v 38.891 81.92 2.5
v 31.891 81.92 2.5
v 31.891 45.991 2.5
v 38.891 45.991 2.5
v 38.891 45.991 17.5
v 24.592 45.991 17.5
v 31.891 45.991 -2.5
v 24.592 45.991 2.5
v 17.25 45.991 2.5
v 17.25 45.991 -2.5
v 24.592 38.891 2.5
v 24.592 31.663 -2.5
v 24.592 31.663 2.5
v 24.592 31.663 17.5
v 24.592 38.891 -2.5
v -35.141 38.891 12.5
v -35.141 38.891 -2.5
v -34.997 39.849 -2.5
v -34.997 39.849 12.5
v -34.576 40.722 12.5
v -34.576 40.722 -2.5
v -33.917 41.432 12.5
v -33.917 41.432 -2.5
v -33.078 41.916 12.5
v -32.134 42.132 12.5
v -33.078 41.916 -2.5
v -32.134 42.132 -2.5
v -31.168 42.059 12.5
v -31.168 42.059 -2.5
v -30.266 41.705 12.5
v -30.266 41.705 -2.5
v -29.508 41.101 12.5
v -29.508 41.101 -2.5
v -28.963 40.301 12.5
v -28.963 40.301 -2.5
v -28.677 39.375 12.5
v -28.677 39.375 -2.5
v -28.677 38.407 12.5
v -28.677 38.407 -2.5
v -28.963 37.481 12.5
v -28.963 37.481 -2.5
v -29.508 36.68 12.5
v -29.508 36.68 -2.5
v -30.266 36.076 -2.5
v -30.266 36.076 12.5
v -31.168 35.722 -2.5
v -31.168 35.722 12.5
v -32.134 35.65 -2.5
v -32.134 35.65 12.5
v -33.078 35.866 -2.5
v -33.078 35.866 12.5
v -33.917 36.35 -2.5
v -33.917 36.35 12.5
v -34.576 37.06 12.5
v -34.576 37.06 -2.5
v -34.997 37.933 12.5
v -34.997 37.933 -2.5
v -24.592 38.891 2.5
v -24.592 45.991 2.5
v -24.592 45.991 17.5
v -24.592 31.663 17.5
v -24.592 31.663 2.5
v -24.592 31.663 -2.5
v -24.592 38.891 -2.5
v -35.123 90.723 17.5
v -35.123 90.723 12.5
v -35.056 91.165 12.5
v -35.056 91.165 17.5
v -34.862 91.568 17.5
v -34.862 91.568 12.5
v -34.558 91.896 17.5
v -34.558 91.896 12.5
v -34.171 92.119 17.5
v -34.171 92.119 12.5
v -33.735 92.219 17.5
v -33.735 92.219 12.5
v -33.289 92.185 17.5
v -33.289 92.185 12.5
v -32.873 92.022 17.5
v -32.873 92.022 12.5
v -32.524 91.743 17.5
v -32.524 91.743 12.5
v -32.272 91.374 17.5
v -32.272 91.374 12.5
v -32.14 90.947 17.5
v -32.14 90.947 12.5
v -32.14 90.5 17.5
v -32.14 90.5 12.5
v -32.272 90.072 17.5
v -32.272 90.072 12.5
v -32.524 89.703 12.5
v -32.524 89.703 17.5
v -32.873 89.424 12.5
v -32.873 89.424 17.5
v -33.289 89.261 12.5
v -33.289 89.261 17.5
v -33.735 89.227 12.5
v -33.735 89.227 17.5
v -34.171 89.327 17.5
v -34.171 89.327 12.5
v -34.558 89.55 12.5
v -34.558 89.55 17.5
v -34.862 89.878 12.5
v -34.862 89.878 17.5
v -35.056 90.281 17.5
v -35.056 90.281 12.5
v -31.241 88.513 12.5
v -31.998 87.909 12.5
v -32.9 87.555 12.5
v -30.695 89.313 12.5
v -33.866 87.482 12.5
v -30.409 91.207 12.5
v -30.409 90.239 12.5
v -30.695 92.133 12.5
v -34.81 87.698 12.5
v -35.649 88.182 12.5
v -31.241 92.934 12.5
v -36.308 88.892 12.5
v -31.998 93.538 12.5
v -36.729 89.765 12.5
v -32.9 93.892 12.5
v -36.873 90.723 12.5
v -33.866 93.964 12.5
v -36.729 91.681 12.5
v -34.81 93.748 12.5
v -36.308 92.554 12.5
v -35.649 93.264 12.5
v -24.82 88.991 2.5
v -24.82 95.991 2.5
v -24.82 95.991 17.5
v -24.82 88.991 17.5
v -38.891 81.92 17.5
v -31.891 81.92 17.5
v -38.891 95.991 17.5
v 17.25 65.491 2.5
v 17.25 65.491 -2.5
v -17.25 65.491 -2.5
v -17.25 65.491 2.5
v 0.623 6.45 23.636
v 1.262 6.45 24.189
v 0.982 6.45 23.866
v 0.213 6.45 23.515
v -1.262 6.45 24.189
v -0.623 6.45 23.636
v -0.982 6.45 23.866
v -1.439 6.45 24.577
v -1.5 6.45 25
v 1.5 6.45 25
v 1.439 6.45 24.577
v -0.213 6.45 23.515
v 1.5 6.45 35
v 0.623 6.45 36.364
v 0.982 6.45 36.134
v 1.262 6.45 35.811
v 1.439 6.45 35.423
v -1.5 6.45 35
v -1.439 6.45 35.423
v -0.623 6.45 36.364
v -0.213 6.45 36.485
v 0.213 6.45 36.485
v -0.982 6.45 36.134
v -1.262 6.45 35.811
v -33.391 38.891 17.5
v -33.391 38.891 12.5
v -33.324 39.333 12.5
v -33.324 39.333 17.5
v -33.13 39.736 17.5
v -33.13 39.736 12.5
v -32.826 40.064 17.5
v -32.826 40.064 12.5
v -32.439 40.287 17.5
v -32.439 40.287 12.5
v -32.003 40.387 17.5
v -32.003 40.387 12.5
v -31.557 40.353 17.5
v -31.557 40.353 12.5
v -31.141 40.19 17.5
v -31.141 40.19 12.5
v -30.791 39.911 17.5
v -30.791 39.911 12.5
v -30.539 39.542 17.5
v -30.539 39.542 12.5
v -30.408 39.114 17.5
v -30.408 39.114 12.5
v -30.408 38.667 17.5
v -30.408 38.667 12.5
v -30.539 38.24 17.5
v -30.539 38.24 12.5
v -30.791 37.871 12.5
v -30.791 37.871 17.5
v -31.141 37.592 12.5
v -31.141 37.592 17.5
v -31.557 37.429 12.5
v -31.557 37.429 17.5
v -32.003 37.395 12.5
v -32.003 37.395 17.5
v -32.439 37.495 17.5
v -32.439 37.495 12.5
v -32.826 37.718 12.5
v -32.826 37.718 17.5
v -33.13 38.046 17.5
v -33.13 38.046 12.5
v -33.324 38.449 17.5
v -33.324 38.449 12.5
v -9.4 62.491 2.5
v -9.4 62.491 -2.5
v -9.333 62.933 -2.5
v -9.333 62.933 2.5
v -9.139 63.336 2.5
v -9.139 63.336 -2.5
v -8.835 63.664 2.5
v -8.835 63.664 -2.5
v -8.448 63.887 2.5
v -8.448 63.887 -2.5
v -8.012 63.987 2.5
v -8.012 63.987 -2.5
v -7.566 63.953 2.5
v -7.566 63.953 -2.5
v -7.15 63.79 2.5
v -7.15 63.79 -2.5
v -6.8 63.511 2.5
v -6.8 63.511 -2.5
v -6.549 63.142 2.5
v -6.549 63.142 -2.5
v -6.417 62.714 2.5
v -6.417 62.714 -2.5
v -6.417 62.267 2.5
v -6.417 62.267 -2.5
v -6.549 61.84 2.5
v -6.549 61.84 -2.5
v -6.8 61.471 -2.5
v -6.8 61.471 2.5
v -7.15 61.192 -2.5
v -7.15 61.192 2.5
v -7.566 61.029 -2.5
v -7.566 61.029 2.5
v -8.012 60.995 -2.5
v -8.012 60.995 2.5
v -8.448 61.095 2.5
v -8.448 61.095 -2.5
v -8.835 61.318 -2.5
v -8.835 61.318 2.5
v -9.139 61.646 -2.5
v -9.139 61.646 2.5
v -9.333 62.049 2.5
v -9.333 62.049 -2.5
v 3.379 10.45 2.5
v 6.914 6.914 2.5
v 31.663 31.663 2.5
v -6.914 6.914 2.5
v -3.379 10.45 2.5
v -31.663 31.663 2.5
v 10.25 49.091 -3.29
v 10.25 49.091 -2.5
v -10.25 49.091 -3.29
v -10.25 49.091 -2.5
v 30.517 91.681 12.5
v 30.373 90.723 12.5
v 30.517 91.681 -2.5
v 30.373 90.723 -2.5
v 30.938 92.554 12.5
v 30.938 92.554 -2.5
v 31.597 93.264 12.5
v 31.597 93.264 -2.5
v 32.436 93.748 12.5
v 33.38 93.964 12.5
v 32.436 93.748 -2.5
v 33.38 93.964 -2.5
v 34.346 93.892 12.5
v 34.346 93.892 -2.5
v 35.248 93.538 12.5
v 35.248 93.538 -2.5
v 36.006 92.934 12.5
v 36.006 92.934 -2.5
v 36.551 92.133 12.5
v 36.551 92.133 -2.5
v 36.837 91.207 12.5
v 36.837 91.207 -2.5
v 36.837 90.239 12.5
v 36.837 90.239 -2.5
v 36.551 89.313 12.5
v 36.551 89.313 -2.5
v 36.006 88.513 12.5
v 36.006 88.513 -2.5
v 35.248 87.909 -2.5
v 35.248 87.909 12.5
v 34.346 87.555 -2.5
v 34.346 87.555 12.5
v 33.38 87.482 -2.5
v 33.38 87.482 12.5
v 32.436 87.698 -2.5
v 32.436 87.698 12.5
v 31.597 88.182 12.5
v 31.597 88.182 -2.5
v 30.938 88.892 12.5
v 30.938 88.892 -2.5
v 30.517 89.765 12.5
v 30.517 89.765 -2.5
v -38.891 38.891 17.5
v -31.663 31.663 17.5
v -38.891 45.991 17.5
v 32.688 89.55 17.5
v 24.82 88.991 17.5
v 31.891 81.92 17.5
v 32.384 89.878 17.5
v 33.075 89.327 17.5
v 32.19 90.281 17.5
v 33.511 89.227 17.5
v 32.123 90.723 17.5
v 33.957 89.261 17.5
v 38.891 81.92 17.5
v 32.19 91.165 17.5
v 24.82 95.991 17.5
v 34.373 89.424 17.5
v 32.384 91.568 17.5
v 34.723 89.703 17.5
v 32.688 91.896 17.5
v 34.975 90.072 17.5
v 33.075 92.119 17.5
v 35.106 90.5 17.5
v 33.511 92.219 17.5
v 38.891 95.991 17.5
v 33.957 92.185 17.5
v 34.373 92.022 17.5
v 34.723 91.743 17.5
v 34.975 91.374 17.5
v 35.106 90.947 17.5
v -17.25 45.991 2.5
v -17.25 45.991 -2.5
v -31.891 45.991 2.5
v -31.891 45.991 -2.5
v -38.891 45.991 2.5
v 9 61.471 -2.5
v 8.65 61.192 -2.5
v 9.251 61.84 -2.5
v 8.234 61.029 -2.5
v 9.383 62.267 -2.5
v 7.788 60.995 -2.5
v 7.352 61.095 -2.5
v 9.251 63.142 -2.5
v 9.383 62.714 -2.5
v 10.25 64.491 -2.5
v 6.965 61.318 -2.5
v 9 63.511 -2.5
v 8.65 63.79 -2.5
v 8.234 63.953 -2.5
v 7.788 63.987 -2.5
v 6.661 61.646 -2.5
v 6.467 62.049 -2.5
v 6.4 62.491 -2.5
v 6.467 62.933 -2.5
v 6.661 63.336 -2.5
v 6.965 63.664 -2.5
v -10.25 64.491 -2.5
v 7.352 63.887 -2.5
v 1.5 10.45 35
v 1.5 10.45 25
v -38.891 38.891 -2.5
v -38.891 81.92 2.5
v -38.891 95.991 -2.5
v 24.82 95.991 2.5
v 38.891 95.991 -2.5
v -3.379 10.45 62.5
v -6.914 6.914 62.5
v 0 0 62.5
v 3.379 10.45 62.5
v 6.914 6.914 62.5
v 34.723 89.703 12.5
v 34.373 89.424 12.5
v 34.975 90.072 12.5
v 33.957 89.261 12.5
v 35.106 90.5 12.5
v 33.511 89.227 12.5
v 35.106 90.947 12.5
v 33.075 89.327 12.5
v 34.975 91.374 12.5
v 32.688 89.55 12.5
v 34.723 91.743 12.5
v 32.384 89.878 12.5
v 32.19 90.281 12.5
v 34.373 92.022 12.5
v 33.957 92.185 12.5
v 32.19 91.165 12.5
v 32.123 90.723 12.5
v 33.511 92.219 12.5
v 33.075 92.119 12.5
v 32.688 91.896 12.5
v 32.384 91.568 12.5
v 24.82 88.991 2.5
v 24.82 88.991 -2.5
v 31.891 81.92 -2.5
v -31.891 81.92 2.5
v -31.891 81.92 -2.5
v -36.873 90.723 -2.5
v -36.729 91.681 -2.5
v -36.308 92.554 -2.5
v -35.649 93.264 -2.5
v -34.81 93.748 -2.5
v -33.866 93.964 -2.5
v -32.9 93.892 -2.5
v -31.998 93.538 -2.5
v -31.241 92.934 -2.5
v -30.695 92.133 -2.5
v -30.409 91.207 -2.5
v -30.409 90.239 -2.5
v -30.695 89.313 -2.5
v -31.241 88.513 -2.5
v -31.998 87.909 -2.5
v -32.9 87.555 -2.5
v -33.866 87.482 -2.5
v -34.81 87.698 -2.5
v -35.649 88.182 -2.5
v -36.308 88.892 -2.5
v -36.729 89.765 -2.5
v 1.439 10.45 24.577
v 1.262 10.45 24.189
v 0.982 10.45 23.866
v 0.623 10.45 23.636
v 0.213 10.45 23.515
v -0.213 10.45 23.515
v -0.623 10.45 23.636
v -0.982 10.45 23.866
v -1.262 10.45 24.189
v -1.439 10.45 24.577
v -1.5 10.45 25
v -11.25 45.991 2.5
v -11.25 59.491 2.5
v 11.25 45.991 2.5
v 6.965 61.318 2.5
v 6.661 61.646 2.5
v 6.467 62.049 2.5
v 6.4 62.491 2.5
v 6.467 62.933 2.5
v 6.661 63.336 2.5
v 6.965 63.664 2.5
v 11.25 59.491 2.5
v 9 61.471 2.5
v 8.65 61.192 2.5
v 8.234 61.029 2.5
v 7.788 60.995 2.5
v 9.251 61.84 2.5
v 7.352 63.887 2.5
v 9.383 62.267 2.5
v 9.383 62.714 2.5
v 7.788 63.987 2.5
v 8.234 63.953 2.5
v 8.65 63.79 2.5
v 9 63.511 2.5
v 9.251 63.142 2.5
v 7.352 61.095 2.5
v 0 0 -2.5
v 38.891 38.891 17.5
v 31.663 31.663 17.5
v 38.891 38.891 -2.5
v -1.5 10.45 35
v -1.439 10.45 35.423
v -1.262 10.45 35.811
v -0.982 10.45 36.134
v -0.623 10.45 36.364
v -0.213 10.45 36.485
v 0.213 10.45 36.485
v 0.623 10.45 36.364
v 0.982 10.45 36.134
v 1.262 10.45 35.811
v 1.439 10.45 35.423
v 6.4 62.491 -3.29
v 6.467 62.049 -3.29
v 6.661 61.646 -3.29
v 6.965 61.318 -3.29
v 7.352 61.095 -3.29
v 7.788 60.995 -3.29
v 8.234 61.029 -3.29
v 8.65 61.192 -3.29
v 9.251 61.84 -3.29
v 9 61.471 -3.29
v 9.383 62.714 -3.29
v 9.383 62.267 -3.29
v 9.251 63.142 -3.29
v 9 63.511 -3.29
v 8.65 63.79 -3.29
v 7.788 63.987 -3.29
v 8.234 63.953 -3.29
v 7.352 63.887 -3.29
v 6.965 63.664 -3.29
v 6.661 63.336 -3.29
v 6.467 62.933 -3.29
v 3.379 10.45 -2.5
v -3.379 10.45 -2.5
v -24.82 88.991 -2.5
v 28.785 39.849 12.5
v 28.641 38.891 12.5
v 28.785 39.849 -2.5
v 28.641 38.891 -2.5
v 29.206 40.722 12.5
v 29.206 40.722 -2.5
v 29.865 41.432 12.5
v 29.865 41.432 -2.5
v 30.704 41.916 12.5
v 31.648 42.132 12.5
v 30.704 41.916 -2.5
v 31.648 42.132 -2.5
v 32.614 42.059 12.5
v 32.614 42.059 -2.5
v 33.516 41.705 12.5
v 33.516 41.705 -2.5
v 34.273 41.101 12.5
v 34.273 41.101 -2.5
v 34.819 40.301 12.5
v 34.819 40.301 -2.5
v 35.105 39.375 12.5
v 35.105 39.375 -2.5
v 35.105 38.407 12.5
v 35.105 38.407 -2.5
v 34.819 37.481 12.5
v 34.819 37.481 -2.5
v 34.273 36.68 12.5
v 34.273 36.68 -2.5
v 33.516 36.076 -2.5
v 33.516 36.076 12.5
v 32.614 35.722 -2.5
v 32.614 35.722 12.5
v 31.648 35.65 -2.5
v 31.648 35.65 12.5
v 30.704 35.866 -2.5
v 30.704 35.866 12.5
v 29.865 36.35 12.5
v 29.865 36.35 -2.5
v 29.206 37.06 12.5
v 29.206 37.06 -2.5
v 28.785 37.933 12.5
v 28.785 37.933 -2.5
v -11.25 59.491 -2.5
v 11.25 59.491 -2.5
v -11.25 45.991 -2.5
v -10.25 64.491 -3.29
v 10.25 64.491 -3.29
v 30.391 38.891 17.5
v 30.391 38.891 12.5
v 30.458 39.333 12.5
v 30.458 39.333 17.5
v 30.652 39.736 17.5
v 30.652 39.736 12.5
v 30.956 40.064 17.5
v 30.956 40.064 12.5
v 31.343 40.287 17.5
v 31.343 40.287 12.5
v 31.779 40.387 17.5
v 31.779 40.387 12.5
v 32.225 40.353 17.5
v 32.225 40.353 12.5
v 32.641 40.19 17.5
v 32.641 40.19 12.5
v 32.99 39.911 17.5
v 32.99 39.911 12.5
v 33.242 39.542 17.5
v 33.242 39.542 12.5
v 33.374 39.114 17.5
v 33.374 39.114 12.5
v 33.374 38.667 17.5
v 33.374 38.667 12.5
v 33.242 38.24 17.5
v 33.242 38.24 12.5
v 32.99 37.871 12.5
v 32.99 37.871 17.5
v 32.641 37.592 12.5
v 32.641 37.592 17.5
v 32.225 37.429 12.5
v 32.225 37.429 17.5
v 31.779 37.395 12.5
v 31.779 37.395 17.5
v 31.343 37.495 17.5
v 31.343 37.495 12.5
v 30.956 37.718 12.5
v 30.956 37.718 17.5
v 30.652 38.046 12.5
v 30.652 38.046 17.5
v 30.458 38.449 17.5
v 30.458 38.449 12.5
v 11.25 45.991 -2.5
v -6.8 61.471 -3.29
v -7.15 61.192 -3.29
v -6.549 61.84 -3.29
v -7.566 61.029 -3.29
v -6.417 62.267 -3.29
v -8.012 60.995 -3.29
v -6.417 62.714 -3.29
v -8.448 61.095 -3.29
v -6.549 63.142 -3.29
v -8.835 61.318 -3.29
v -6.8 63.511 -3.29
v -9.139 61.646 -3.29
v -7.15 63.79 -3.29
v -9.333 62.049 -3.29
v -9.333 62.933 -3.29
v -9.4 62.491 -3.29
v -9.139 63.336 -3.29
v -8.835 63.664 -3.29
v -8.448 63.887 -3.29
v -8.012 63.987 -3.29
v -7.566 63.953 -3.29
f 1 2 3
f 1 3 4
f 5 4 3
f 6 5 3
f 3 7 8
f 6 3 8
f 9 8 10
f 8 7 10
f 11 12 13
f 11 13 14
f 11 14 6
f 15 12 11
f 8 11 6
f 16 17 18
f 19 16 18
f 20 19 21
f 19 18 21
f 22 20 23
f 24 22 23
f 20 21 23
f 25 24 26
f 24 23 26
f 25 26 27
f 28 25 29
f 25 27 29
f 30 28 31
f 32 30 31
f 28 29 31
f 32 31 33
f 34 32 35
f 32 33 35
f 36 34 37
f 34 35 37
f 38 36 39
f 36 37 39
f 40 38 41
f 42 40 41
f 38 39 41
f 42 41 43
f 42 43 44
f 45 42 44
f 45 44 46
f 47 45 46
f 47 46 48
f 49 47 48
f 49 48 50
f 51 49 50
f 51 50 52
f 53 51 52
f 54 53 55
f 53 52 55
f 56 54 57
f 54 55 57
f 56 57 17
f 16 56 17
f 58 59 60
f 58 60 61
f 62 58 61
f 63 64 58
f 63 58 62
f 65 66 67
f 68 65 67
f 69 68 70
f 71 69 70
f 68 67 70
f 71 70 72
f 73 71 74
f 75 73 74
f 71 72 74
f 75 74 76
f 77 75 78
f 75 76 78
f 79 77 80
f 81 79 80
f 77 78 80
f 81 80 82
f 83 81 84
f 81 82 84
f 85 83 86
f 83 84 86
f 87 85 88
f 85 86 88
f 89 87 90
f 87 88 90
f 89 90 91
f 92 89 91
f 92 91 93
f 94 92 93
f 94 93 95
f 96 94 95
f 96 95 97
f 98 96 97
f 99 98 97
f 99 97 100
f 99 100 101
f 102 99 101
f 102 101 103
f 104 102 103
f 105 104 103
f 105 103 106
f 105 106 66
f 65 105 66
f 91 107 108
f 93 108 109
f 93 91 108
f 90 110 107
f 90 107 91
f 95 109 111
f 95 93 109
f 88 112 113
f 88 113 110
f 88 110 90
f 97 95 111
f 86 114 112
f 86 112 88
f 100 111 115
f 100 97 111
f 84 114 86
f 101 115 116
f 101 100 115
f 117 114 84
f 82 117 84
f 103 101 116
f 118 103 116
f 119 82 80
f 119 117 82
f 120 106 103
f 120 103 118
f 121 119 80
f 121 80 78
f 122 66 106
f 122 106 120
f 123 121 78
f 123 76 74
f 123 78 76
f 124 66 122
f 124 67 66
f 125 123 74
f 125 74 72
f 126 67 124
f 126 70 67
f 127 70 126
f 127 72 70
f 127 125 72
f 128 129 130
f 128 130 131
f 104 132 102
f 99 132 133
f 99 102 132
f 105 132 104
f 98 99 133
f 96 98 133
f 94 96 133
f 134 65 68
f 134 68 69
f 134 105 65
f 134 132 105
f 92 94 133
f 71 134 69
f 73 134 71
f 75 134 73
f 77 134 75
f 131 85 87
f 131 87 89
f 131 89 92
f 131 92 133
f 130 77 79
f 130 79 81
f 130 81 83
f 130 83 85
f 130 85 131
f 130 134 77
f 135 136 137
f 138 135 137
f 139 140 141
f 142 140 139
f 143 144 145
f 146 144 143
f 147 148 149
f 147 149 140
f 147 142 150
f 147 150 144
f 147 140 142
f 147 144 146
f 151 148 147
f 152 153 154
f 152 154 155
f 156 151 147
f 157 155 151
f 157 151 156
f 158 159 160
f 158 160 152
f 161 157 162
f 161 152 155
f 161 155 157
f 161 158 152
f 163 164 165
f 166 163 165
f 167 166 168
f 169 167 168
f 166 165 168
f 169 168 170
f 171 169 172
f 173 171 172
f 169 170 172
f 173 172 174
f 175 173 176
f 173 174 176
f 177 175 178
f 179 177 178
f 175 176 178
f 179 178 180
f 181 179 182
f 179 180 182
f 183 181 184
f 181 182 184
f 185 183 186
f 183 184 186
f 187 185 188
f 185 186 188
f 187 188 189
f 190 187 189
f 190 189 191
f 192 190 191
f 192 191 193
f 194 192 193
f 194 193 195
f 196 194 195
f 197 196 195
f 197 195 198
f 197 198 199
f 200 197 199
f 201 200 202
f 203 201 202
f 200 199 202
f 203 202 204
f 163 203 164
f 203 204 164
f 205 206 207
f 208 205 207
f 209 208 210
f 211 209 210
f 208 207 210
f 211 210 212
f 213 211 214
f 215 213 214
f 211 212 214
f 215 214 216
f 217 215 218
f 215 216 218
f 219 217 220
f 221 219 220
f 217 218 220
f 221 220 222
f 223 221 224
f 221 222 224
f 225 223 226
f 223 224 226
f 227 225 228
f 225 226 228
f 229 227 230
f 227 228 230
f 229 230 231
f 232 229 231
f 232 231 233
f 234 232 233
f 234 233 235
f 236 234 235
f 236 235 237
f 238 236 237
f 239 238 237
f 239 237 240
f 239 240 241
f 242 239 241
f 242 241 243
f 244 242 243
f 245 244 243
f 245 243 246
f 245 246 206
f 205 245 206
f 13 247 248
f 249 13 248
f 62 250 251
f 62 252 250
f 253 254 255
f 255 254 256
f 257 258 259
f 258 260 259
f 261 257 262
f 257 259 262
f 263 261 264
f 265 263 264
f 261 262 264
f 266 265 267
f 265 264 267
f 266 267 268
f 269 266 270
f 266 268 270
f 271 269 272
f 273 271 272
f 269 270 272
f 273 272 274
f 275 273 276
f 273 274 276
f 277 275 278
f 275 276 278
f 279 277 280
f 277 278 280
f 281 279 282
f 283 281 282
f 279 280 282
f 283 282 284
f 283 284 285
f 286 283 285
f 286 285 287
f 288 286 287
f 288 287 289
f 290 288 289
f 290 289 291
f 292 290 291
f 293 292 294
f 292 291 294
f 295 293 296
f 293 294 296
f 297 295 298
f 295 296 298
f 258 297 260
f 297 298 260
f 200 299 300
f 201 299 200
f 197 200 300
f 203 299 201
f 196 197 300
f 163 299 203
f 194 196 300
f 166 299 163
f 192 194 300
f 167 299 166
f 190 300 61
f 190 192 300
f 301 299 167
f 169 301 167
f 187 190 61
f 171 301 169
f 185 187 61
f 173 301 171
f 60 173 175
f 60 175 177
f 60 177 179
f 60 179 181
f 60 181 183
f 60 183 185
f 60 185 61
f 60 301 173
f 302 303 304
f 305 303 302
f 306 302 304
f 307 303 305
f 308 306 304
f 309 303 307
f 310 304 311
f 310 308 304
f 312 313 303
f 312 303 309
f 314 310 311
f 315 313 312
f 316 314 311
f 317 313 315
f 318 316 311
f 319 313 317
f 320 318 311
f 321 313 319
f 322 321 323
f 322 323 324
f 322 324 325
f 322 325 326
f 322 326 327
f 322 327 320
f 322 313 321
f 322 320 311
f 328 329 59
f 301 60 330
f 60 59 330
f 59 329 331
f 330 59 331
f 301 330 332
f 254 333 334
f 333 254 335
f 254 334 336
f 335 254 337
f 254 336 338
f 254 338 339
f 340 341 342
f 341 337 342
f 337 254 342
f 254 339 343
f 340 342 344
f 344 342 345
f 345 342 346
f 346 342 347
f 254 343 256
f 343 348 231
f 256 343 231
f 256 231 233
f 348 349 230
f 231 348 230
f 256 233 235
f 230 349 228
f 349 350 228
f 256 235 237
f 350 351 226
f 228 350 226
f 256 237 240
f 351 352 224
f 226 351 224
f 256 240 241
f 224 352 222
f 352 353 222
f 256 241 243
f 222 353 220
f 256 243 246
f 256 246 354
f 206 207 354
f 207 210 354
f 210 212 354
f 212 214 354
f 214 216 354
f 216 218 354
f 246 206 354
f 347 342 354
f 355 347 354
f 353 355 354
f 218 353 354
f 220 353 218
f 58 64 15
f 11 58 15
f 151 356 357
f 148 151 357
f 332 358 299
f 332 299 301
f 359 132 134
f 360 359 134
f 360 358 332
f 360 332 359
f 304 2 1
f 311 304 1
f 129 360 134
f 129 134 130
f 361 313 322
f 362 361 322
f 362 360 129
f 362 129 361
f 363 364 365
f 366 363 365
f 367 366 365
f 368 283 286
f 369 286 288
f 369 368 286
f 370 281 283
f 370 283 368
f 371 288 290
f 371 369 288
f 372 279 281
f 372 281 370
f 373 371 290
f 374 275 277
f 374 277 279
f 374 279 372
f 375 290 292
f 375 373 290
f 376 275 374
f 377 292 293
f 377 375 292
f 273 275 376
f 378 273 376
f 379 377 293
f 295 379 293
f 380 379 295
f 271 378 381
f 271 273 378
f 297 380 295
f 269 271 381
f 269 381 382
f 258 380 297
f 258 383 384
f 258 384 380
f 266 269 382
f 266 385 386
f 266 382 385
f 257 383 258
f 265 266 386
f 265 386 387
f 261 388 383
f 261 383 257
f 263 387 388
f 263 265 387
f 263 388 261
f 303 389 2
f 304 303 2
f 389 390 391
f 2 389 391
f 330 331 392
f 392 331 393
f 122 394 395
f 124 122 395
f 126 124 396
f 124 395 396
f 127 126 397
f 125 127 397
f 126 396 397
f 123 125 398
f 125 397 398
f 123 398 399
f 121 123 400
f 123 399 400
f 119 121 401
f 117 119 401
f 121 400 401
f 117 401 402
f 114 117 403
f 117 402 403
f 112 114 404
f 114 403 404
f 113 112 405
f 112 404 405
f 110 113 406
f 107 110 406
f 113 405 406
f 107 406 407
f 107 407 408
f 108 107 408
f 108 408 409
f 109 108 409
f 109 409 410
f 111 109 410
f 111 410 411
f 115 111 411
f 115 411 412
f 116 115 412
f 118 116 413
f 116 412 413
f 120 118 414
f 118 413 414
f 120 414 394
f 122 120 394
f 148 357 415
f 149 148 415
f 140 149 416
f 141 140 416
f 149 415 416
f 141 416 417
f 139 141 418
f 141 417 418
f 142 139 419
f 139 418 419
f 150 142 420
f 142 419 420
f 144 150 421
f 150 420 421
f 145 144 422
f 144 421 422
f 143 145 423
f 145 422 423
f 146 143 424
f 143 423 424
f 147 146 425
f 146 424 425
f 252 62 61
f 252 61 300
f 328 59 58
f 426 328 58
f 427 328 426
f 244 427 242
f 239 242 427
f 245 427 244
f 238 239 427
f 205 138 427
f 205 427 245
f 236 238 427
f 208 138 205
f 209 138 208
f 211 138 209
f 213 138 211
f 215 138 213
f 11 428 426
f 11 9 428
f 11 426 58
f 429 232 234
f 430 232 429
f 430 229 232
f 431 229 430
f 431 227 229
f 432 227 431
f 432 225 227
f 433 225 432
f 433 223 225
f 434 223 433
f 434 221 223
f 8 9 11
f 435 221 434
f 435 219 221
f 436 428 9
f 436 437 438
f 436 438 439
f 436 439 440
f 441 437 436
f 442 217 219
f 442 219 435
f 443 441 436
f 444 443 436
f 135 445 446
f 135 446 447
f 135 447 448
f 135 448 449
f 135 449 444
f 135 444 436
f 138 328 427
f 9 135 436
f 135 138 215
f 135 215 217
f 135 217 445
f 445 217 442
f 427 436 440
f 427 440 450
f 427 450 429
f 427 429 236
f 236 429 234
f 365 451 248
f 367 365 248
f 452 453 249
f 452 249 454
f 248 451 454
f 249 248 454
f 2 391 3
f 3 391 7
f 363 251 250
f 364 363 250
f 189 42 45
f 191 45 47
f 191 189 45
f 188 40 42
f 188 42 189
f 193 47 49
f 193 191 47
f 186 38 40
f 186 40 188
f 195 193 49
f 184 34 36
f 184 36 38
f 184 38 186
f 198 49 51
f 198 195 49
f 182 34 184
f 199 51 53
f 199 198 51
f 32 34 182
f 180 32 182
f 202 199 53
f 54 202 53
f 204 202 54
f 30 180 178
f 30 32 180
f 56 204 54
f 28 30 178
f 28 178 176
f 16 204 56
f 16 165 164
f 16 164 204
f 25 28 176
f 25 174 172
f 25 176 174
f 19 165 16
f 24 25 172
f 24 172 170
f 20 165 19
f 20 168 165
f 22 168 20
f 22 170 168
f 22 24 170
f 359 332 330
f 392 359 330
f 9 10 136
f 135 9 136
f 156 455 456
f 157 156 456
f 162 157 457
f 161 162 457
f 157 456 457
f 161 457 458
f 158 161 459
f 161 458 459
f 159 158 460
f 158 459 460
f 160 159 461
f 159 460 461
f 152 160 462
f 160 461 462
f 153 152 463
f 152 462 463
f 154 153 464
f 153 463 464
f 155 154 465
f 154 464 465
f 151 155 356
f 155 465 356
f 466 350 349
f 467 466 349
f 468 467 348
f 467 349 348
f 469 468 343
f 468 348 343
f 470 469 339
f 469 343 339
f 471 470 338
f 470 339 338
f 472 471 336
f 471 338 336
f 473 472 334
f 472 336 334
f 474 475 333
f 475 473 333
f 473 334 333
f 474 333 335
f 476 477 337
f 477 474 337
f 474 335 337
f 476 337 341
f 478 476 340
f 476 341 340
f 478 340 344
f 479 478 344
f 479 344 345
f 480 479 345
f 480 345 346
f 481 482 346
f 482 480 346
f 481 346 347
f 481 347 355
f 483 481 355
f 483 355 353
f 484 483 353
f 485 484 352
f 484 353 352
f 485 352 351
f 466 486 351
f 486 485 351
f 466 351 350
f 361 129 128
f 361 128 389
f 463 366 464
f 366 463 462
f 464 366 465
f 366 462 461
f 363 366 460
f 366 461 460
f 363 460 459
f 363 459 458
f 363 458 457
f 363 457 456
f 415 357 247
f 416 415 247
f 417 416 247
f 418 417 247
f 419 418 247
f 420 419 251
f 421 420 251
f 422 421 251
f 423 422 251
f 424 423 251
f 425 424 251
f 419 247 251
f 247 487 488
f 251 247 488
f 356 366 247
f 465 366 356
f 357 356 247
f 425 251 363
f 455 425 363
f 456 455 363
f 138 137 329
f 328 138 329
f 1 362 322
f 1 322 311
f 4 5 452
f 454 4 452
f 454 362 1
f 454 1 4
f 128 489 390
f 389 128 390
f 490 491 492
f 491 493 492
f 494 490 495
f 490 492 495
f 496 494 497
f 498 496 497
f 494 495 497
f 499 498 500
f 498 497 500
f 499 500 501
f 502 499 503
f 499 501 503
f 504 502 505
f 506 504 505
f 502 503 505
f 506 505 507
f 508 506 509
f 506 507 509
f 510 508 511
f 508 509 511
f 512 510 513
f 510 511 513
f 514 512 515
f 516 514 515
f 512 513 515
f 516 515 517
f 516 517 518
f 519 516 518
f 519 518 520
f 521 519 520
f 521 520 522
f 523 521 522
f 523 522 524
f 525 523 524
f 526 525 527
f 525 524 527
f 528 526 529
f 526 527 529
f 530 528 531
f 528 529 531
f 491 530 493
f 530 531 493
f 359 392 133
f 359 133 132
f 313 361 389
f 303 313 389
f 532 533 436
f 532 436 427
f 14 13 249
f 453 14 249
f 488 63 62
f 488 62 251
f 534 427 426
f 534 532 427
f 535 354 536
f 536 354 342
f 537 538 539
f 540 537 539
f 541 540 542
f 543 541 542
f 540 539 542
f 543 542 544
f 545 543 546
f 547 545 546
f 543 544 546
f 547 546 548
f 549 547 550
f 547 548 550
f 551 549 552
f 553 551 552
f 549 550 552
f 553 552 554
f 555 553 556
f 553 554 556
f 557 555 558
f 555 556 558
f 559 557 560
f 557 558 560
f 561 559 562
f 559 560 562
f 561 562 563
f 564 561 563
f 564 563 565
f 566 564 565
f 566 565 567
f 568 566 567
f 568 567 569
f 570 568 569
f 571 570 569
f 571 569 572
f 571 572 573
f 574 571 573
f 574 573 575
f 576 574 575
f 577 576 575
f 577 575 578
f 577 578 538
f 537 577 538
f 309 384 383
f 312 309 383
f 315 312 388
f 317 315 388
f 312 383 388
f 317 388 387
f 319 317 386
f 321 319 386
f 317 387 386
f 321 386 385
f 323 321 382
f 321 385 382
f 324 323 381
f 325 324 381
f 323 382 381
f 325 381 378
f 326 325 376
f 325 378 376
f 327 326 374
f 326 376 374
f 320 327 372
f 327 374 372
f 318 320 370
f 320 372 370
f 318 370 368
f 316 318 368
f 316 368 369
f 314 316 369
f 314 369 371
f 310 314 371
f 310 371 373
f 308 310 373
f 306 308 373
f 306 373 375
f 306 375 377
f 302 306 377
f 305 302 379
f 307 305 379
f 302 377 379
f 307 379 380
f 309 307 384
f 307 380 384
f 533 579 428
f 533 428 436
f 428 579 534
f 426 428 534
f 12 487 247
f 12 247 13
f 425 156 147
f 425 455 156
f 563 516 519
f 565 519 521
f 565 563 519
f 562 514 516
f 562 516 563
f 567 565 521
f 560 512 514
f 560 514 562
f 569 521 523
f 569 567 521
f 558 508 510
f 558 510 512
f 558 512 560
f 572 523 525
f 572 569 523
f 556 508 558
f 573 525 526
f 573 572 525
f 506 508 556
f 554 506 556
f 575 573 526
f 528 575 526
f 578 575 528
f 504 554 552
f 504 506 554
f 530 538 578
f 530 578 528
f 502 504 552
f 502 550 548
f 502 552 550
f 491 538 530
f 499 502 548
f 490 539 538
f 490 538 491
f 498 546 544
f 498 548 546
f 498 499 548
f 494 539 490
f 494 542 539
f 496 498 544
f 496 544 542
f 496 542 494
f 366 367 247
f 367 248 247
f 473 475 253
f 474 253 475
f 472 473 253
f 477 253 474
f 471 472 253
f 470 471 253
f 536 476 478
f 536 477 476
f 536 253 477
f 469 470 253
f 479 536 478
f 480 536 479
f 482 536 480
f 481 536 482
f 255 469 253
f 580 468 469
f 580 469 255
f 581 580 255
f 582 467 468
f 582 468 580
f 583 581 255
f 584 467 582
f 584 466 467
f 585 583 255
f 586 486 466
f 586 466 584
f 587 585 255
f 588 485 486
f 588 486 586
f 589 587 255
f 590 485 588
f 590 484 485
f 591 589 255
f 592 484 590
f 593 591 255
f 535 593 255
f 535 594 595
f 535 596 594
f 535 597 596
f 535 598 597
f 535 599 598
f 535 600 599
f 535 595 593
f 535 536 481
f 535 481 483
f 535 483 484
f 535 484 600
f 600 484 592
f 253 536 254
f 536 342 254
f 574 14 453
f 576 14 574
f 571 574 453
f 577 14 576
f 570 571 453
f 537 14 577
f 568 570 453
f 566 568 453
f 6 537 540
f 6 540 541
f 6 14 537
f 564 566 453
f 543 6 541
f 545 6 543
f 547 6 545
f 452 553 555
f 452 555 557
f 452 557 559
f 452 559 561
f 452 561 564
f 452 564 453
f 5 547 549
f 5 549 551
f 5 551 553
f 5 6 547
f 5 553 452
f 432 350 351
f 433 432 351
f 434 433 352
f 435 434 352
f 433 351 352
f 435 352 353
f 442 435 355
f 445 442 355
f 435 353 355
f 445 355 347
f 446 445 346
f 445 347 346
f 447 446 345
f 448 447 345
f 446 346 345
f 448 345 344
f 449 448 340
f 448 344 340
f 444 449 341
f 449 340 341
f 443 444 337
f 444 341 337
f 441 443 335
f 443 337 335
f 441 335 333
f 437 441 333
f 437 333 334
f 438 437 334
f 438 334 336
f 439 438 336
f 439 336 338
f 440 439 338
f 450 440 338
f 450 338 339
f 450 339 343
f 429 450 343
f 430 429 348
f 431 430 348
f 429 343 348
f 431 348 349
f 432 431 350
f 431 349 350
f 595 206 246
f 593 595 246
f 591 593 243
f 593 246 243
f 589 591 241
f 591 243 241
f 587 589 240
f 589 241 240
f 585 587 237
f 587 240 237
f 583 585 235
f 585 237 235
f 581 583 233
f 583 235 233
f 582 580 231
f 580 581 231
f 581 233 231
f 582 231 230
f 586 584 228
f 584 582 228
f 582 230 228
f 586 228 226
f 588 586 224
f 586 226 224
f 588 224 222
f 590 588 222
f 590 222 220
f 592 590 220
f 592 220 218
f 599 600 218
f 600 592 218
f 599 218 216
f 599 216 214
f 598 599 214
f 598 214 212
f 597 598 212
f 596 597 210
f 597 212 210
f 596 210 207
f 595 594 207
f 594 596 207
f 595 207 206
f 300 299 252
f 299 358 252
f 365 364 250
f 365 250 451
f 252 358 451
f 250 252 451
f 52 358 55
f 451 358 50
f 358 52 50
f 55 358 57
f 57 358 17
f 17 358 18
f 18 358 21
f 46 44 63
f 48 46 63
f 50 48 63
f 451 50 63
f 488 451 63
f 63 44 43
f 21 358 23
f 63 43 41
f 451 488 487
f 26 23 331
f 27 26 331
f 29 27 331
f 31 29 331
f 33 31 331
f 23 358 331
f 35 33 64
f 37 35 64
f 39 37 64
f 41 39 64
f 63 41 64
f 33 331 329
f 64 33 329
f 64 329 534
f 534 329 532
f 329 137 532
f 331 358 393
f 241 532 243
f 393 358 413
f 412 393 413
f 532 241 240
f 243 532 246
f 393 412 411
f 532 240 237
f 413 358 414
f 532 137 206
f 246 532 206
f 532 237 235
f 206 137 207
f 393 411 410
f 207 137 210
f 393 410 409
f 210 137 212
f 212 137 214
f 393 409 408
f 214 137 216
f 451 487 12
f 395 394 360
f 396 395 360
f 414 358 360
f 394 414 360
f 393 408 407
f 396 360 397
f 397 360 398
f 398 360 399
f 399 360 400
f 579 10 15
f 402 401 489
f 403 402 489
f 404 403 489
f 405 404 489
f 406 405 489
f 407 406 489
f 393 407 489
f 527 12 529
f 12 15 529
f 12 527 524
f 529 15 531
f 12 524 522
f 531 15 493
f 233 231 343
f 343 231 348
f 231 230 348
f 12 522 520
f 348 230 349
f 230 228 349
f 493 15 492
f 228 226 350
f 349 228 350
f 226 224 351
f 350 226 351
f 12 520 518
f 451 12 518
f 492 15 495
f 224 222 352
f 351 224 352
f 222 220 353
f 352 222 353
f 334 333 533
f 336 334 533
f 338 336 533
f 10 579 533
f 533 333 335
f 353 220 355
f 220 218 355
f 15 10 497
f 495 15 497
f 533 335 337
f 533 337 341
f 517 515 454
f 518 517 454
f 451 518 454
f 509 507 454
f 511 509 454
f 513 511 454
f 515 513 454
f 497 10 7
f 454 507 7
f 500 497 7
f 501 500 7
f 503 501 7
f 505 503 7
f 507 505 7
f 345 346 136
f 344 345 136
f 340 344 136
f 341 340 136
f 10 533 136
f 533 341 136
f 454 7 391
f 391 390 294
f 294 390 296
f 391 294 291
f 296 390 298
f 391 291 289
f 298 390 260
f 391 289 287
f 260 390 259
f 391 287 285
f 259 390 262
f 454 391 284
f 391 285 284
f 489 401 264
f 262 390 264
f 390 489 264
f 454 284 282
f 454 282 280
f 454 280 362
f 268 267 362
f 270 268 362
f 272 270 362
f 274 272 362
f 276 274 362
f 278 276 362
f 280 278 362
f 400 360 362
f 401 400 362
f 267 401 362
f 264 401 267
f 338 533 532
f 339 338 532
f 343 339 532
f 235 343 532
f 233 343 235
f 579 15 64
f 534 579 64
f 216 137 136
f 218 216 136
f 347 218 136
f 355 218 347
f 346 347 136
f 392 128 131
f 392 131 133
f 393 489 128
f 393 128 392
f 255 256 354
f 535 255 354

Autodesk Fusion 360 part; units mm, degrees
sketch "スケッチ1" plane through (0, 0, 0) normal (0, 0, 1) x (1, 0, 0)
  line L0 (-38.8909, 38.8909) -> (0, 0)
  line L1 (0, 0) -> (38.8909, 38.8909)
  line L2 (38.8909, 38.8909) -> (-38.8909, 38.8909) construction
  line L3 (0, 38.8909) -> (0, 0) construction
  line L4 (-24.5921, 31.6632) -> (-3.3789, 10.45)
  line L5 (-3.3789, 10.45) -> (3.3789, 10.45)
  line L6 (3.3789, 10.45) -> (24.5921, 31.6632)
  line L7 (24.5921, 31.6632) -> (24.5921, 38.8909)
  line L8 (-24.5921, 38.8909) -> (-24.5921, 31.6632)
  line L9 (-24.5921, 38.8909) -> (24.5921, 38.8909)
  line L10 (-38.8909, 38.8909) -> (-38.8909, 45.9909)
  line L11 (-31.8909, 45.9909) -> (31.8909, 45.9909)
  line L12 (38.8909, 45.9909) -> (38.8909, 38.8909)
  line L13 (31.8909, 45.9909) -> (-31.8909, 45.9909)
  line L14 (-38.8909, 45.9909) -> (-38.8909, 95.9909)
  line L15 (-38.8909, 95.9909) -> (38.8909, 95.9909)
  line L16 (38.8909, 95.9909) -> (38.8909, 45.9909)
  line L17 (38.8909, 45.9909) -> (-38.8909, 95.9909) construction
  line L18 (-38.8909, 45.9909) -> (38.8909, 95.9909) construction
  line L19 (-31.8909, 45.9909) -> (-31.8909, 81.9198)
  line L20 (-24.8198, 88.9909) -> (24.8198, 88.9909)
  line L21 (31.8909, 81.9198) -> (31.8909, 45.9909)
  line L22 (-24.8198, 88.9909) -> (-31.8909, 81.9198)
  line L23 (24.8198, 88.9909) -> (31.8909, 81.9198)
  point P0 (0, 70.9909)
  point P1 (0, 70.9909)
  dimension "d1" = 55
  dimension "d3" = 55
  dimension "d4" = 5
  dimension "d5" = 5
  dimension "d6" = 30
  dimension "d7" = 30
  dimension "d8" = 10.45
  dimension "d9" = 7.1
  dimension "d10" = 50
  dimension "d11" = 7
  dimension "d13" = 45
  dimension "d14" = 45
  dimension "d15" = 10
  dimension "d16" = 10
  dimension "d17" = 7
  dimension "d18" = 7
  dimension "d19" = 57.1
  dimension "d20" = 7.1
extrude "押し出し1" add sketch "スケッチ1" along normal mid plane 5 makes body 1
sketch "スケッチ2" plane through (0, 0, 2.5) normal (0, 0, 1) x (1, 0, 0)
  line L0 (-31.8909, 81.9198) -> (-24.8198, 88.9909)
  line L1 (-24.8198, 88.9909) -> (24.8198, 88.9909)
  line L2 (24.8198, 88.9909) -> (31.8909, 81.9198)
  line L3 (31.8909, 81.9198) -> (31.8909, 45.9909)
  line L4 (31.8909, 45.9909) -> (-31.8909, 45.9909)
  line L5 (-31.8909, 45.9909) -> (-31.8909, 81.9198)
  line L6 (-3.3789, 10.45) -> (-24.5921, 31.6632)
  line L7 (-24.5921, 31.6632) -> (-24.5921, 38.8909)
  line L8 (-24.5921, 38.8909) -> (24.5921, 38.8909)
  line L9 (24.5921, 38.8909) -> (24.5921, 31.6632)
  line L10 (24.5921, 31.6632) -> (3.3789, 10.45)
  line L11 (3.3789, 10.45) -> (-3.3789, 10.45)
  line L12 (-38.8909, 38.8909) -> (0, 0)
  line L13 (0, 0) -> (38.8909, 38.8909)
  line L14 (38.8909, 38.8909) -> (38.8909, 95.9909)
  line L15 (38.8909, 95.9909) -> (-38.8909, 95.9909)
  line L16 (-38.8909, 95.9909) -> (-38.8909, 38.8909)
  line L17 (-24.8198, 95.9909) -> (-24.8198, 88.9909)
  line L18 (-24.8198, 88.9909) -> (-31.8909, 81.9198)
  line L19 (-31.8909, 81.9198) -> (-38.8909, 81.9198)
  line L20 (-38.8909, 81.9198) -> (-38.8909, 95.9909)
  line L21 (-38.8909, 95.9909) -> (-24.8198, 95.9909)
  line L22 (24.8198, 95.9909) -> (24.8198, 88.9909)
  line L23 (24.8198, 88.9909) -> (31.8909, 81.9198)
  line L24 (31.8909, 81.9198) -> (38.8909, 81.9198)
  line L25 (38.8909, 81.9198) -> (38.8909, 95.9909)
  line L26 (38.8909, 95.9909) -> (24.8198, 95.9909)
  line L27 (-24.5921, 45.9909) -> (-24.5921, 31.6632)
  line L28 (-24.5921, 31.6632) -> (-31.6632, 31.6632)
  line L29 (-31.6632, 31.6632) -> (-38.8909, 38.8909)
  line L30 (-38.8909, 38.8909) -> (-38.8909, 45.9909)
  line L31 (-38.8909, 45.9909) -> (-24.5921, 45.9909)
  line L32 (24.5921, 45.9909) -> (24.5921, 31.6632)
  line L33 (24.5921, 31.6632) -> (31.6632, 31.6632)
  line L34 (31.6632, 31.6632) -> (38.8909, 38.8909)
  line L35 (38.8909, 38.8909) -> (38.8909, 45.9909)
  line L36 (38.8909, 45.9909) -> (24.5921, 45.9909)
  line L37 (-3.3789, 10.45) -> (-6.9145, 6.9145)
  line L38 (-6.9145, 6.9145) -> (0, 0)
  line L39 (0, 0) -> (6.9145, 6.9145)
  line L40 (6.9145, 6.9145) -> (3.3789, 10.45)
  line L41 (3.3789, 10.45) -> (-3.3789, 10.45)
extrude "押し出し2" add sketch "スケッチ2" along normal blind 15 contours L0 L15 L16 L17 L18 L19 L20 L21 | L4 L7 L12 L16 L27 L28 L29 L30 L31 | L2 L14 L15 L22 L23 L24 L25 L26 | L4 L9 L13 L14 L32 L33 L34 L35 L36 bodies 1
extrude "押し出し3" add sketch "スケッチ2" along normal blind 60 contours L11 L12 L13 L37 L38 L39 L40 L41 bodies 1
sketch "スケッチ3" plane through (0, 0, -2.5) normal (0, 0, -1) x (-1, 0, 0)
  line L0 (24.8198, 88.9909) -> (31.8909, 81.9198)
  line L1 (31.8909, 81.9198) -> (31.8909, 45.9909)
  line L2 (31.8909, 45.9909) -> (-31.8909, 45.9909)
  line L3 (-31.8909, 45.9909) -> (-31.8909, 81.9198)
  line L4 (-31.8909, 81.9198) -> (-24.8198, 88.9909)
  line L5 (-24.8198, 88.9909) -> (24.8198, 88.9909)
  line L6 (24.5921, 31.6632) -> (3.3789, 10.45)
  line L7 (3.3789, 10.45) -> (-3.3789, 10.45)
  line L8 (-3.3789, 10.45) -> (-24.5921, 31.6632)
  line L9 (-24.5921, 31.6632) -> (-24.5921, 38.8909)
  line L10 (-24.5921, 38.8909) -> (24.5921, 38.8909)
  line L11 (24.5921, 38.8909) -> (24.5921, 31.6632)
  line L12 (0, 0) -> (38.8909, 38.8909)
  line L13 (38.8909, 38.8909) -> (38.8909, 95.9909)
  line L14 (38.8909, 95.9909) -> (-38.8909, 95.9909)
  line L15 (-38.8909, 95.9909) -> (-38.8909, 38.8909)
  line L16 (-38.8909, 38.8909) -> (0, 0)
  line L17 (-38.8909, 95.9909) -> (-28.3553, 85.4553) construction
  line L18 (38.8909, 95.9909) -> (28.3553, 85.4553) construction
  circle A0 centre (-33.6231, 90.7231) radius 3.25
  circle A1 centre (33.6231, 90.7231) radius 3.25
  circle A2 centre (-31.8909, 38.8909) radius 3.25
  circle A3 centre (31.8909, 38.8909) radius 3.25
  line L19 (-24.5921, 38.8909) -> (-38.8909, 38.8909) construction
  line L20 (-31.8909, 45.9909) -> (-31.8909, 31.8909) construction
  line L21 (24.5921, 38.8909) -> (38.8909, 38.8909) construction
  line L22 (31.8909, 45.9909) -> (31.8909, 31.8909) construction
  circle A4 centre (-31.8909, 38.8909) radius 1.5
  circle A5 centre (31.8909, 38.8909) radius 1.5
  circle A6 centre (33.6231, 90.7231) radius 1.5
  circle A7 centre (-33.6231, 90.7231) radius 1.5
  dimension "d27" = 6.5
  dimension "d28" = 6.5
  dimension "d29" = 6.5
  dimension "d30" = 6.5
  dimension "d31" = 3
  dimension "d32" = 3
  dimension "d33" = 3
  dimension "d34" = 3
extrude "押し出し4" cut sketch "スケッチ3" against normal blind 25 contours A4 | A5 | A6 | A7 bodies 1
extrude "押し出し5" cut sketch "スケッチ3" against normal blind 15 contours A0 | A1 | A2 | A3 bodies 1
sketch "スケッチ4" plane through (0, 10.45, 0) normal (0, 1, 0) x (-1, 0, 0)
  line L0 (3.3789, -2.5) -> (3.3789, 2.5)
  line L1 (3.3789, 2.5) -> (3.3789, 62.5)
  line L2 (3.3789, 62.5) -> (-3.3789, 62.5)
  line L3 (-3.3789, 62.5) -> (-3.3789, 2.5)
  line L4 (-3.3789, 2.5) -> (-3.3789, -2.5)
  line L5 (-3.3789, -2.5) -> (3.3789, -2.5)
  arc A0 (1.5, 35) -> (-1.5, 35) centre (0, 35) ccw
  arc A1 (-1.5, 25) -> (1.5, 25) centre (0, 25) ccw
  line L6 (0, 35) -> (0, 25) construction
  line L7 (-1.5, 35) -> (-1.5, 25)
  line L8 (1.5, 35) -> (1.5, 25)
  line L9 (0, 25) -> (0, 0) construction
  dimension "d39" = 1.5
  dimension "d40" = 1.5
  dimension "d41" = 25
  dimension "d42" = 35
extrude "押し出し6" cut sketch "スケッチ4" against normal blind 4 contours A0 A1 L7 L8 bodies 1
sketch "スケッチ5" plane through (0, 0, -2.5) normal (0, 0, -1) x (-1, 0, 0)
  line L0 (24.8198, 88.9909) -> (31.8909, 81.9198)
  line L1 (31.8909, 81.9198) -> (31.8909, 45.9909)
  line L2 (31.8909, 45.9909) -> (-31.8909, 45.9909)
  line L3 (-31.8909, 45.9909) -> (-31.8909, 81.9198)
  line L4 (-31.8909, 81.9198) -> (-24.8198, 88.9909)
  line L5 (-24.8198, 88.9909) -> (24.8198, 88.9909)
  line L6 (24.5921, 31.6632) -> (3.3789, 10.45)
  line L7 (3.3789, 10.45) -> (-3.3789, 10.45)
  line L8 (-3.3789, 10.45) -> (-24.5921, 31.6632)
  line L9 (-24.5921, 31.6632) -> (-24.5921, 38.8909)
  line L10 (-24.5921, 38.8909) -> (24.5921, 38.8909)
  line L11 (24.5921, 38.8909) -> (24.5921, 31.6632)
  line L12 (0, 0) -> (38.8909, 38.8909)
  line L13 (38.8909, 38.8909) -> (38.8909, 95.9909)
  line L14 (38.8909, 95.9909) -> (-38.8909, 95.9909)
  line L15 (-38.8909, 95.9909) -> (-38.8909, 38.8909)
  line L16 (-38.8909, 38.8909) -> (0, 0)
  circle A0 centre (31.8909, 38.8909) radius 3.25
  circle A1 centre (-33.6231, 90.7231) radius 3.25
  circle A2 centre (33.6231, 90.7231) radius 3.25
  circle A3 centre (-31.8909, 38.8909) radius 3.25
  line L17 (-11.25, 45.9909) -> (-11.25, 59.4909)
  line L18 (-11.25, 59.4909) -> (11.25, 59.4909)
  line L19 (11.25, 59.4909) -> (11.25, 45.9909)
  line L20 (-17.25, 45.9909) -> (-17.25, 65.4909)
  line L21 (-17.25, 65.4909) -> (17.25, 65.4909)
  line L22 (17.25, 65.4909) -> (17.25, 45.9909)
  line L23 (0, 0) -> (0, 59.4909) construction
  circle A4 centre (-7.9, 62.4909) radius 1.5
  circle A5 centre (7.9, 62.4909) radius 1.5
  line L24 (-7.9, 62.4909) -> (7.9, 62.4909) construction
  line L25 (0, 59.4909) -> (0, 62.4909) construction
  dimension "d45" = 6
  dimension "d46" = 6
  dimension "d47" = 6
  dimension "d48" = 22.5
  dimension "d49" = 13.5
  dimension "d50" = 15.8
  dimension "d51" = 3
  dimension "d52" = 3
  dimension "d53" = 3
extrude "押し出し7" add sketch "スケッチ5" against normal blind 5 contours L2 L17 L18 L19 L20 L21 L22 bodies 1
sketch "スケッチ6" plane through (0, 0, -2.5) normal (0, 0, -1) x (-1, 0, 0)
  line L0 (11.25, 45.9909) -> (-11.25, 45.9909)
  line L1 (-11.25, 45.9909) -> (-11.25, 59.4909)
  line L2 (-11.25, 59.4909) -> (11.25, 59.4909)
  line L3 (11.25, 59.4909) -> (11.25, 45.9909)
  circle A0 centre (7.9, 62.4909) radius 1.5
  circle A1 centre (-7.9, 62.4909) radius 1.5
  line L4 (17.25, 45.9909) -> (17.25, 65.4909)
  line L5 (17.25, 65.4909) -> (-17.25, 65.4909)
  line L6 (-17.25, 65.4909) -> (-17.25, 45.9909)
  line L7 (-17.25, 45.9909) -> (-31.8909, 45.9909)
  line L8 (-31.8909, 45.9909) -> (-31.8909, 81.9198)
  line L9 (-31.8909, 81.9198) -> (-24.8198, 88.9909)
  line L10 (-24.8198, 88.9909) -> (24.8198, 88.9909)
  line L11 (24.8198, 88.9909) -> (31.8909, 81.9198)
  line L12 (31.8909, 81.9198) -> (31.8909, 45.9909)
  line L13 (31.8909, 45.9909) -> (17.25, 45.9909)
  line L14 (24.5921, 31.6632) -> (3.3789, 10.45)
  line L15 (3.3789, 10.45) -> (-3.3789, 10.45)
  line L16 (-3.3789, 10.45) -> (-24.5921, 31.6632)
  line L17 (-24.5921, 31.6632) -> (-24.5921, 38.8909)
  line L18 (-24.5921, 38.8909) -> (24.5921, 38.8909)
  line L19 (24.5921, 38.8909) -> (24.5921, 31.6632)
  line L20 (0, 0) -> (38.8909, 38.8909)
  line L21 (38.8909, 38.8909) -> (38.8909, 95.9909)
  line L22 (38.8909, 95.9909) -> (-38.8909, 95.9909)
  line L23 (-38.8909, 95.9909) -> (-38.8909, 38.8909)
  line L24 (-38.8909, 38.8909) -> (0, 0)
  circle A2 centre (31.8909, 38.8909) radius 3.25
  circle A3 centre (-33.6231, 90.7231) radius 3.25
  circle A4 centre (33.6231, 90.7231) radius 3.25
  circle A5 centre (-31.8909, 38.8909) radius 3.25
  line L25 (10.25, 64.4909) -> (-10.25, 64.4909)
  line L26 (-10.25, 64.4909) -> (-10.25, 49.0909)
  line L27 (-10.25, 49.0909) -> (10.25, 49.0909)
  line L28 (10.25, 49.0909) -> (10.25, 64.4909)
  line L29 (10.25, 64.4909) -> (-10.25, 49.0909) construction
  line L30 (-10.25, 64.4909) -> (10.25, 49.0909) construction
  line L31 (0, 56.7909) -> (0, 0) construction
  point P0 (0, 56.7909)
  dimension "d56" = 20.5
  dimension "d57" = 15.4
  dimension "d58" = 2
extrude "押し出し8" add sketch "スケッチ6" along normal blind 0.79 separate body contours L2 L26 L27 L28 | L2 L25 L26 L28 makes body 2
